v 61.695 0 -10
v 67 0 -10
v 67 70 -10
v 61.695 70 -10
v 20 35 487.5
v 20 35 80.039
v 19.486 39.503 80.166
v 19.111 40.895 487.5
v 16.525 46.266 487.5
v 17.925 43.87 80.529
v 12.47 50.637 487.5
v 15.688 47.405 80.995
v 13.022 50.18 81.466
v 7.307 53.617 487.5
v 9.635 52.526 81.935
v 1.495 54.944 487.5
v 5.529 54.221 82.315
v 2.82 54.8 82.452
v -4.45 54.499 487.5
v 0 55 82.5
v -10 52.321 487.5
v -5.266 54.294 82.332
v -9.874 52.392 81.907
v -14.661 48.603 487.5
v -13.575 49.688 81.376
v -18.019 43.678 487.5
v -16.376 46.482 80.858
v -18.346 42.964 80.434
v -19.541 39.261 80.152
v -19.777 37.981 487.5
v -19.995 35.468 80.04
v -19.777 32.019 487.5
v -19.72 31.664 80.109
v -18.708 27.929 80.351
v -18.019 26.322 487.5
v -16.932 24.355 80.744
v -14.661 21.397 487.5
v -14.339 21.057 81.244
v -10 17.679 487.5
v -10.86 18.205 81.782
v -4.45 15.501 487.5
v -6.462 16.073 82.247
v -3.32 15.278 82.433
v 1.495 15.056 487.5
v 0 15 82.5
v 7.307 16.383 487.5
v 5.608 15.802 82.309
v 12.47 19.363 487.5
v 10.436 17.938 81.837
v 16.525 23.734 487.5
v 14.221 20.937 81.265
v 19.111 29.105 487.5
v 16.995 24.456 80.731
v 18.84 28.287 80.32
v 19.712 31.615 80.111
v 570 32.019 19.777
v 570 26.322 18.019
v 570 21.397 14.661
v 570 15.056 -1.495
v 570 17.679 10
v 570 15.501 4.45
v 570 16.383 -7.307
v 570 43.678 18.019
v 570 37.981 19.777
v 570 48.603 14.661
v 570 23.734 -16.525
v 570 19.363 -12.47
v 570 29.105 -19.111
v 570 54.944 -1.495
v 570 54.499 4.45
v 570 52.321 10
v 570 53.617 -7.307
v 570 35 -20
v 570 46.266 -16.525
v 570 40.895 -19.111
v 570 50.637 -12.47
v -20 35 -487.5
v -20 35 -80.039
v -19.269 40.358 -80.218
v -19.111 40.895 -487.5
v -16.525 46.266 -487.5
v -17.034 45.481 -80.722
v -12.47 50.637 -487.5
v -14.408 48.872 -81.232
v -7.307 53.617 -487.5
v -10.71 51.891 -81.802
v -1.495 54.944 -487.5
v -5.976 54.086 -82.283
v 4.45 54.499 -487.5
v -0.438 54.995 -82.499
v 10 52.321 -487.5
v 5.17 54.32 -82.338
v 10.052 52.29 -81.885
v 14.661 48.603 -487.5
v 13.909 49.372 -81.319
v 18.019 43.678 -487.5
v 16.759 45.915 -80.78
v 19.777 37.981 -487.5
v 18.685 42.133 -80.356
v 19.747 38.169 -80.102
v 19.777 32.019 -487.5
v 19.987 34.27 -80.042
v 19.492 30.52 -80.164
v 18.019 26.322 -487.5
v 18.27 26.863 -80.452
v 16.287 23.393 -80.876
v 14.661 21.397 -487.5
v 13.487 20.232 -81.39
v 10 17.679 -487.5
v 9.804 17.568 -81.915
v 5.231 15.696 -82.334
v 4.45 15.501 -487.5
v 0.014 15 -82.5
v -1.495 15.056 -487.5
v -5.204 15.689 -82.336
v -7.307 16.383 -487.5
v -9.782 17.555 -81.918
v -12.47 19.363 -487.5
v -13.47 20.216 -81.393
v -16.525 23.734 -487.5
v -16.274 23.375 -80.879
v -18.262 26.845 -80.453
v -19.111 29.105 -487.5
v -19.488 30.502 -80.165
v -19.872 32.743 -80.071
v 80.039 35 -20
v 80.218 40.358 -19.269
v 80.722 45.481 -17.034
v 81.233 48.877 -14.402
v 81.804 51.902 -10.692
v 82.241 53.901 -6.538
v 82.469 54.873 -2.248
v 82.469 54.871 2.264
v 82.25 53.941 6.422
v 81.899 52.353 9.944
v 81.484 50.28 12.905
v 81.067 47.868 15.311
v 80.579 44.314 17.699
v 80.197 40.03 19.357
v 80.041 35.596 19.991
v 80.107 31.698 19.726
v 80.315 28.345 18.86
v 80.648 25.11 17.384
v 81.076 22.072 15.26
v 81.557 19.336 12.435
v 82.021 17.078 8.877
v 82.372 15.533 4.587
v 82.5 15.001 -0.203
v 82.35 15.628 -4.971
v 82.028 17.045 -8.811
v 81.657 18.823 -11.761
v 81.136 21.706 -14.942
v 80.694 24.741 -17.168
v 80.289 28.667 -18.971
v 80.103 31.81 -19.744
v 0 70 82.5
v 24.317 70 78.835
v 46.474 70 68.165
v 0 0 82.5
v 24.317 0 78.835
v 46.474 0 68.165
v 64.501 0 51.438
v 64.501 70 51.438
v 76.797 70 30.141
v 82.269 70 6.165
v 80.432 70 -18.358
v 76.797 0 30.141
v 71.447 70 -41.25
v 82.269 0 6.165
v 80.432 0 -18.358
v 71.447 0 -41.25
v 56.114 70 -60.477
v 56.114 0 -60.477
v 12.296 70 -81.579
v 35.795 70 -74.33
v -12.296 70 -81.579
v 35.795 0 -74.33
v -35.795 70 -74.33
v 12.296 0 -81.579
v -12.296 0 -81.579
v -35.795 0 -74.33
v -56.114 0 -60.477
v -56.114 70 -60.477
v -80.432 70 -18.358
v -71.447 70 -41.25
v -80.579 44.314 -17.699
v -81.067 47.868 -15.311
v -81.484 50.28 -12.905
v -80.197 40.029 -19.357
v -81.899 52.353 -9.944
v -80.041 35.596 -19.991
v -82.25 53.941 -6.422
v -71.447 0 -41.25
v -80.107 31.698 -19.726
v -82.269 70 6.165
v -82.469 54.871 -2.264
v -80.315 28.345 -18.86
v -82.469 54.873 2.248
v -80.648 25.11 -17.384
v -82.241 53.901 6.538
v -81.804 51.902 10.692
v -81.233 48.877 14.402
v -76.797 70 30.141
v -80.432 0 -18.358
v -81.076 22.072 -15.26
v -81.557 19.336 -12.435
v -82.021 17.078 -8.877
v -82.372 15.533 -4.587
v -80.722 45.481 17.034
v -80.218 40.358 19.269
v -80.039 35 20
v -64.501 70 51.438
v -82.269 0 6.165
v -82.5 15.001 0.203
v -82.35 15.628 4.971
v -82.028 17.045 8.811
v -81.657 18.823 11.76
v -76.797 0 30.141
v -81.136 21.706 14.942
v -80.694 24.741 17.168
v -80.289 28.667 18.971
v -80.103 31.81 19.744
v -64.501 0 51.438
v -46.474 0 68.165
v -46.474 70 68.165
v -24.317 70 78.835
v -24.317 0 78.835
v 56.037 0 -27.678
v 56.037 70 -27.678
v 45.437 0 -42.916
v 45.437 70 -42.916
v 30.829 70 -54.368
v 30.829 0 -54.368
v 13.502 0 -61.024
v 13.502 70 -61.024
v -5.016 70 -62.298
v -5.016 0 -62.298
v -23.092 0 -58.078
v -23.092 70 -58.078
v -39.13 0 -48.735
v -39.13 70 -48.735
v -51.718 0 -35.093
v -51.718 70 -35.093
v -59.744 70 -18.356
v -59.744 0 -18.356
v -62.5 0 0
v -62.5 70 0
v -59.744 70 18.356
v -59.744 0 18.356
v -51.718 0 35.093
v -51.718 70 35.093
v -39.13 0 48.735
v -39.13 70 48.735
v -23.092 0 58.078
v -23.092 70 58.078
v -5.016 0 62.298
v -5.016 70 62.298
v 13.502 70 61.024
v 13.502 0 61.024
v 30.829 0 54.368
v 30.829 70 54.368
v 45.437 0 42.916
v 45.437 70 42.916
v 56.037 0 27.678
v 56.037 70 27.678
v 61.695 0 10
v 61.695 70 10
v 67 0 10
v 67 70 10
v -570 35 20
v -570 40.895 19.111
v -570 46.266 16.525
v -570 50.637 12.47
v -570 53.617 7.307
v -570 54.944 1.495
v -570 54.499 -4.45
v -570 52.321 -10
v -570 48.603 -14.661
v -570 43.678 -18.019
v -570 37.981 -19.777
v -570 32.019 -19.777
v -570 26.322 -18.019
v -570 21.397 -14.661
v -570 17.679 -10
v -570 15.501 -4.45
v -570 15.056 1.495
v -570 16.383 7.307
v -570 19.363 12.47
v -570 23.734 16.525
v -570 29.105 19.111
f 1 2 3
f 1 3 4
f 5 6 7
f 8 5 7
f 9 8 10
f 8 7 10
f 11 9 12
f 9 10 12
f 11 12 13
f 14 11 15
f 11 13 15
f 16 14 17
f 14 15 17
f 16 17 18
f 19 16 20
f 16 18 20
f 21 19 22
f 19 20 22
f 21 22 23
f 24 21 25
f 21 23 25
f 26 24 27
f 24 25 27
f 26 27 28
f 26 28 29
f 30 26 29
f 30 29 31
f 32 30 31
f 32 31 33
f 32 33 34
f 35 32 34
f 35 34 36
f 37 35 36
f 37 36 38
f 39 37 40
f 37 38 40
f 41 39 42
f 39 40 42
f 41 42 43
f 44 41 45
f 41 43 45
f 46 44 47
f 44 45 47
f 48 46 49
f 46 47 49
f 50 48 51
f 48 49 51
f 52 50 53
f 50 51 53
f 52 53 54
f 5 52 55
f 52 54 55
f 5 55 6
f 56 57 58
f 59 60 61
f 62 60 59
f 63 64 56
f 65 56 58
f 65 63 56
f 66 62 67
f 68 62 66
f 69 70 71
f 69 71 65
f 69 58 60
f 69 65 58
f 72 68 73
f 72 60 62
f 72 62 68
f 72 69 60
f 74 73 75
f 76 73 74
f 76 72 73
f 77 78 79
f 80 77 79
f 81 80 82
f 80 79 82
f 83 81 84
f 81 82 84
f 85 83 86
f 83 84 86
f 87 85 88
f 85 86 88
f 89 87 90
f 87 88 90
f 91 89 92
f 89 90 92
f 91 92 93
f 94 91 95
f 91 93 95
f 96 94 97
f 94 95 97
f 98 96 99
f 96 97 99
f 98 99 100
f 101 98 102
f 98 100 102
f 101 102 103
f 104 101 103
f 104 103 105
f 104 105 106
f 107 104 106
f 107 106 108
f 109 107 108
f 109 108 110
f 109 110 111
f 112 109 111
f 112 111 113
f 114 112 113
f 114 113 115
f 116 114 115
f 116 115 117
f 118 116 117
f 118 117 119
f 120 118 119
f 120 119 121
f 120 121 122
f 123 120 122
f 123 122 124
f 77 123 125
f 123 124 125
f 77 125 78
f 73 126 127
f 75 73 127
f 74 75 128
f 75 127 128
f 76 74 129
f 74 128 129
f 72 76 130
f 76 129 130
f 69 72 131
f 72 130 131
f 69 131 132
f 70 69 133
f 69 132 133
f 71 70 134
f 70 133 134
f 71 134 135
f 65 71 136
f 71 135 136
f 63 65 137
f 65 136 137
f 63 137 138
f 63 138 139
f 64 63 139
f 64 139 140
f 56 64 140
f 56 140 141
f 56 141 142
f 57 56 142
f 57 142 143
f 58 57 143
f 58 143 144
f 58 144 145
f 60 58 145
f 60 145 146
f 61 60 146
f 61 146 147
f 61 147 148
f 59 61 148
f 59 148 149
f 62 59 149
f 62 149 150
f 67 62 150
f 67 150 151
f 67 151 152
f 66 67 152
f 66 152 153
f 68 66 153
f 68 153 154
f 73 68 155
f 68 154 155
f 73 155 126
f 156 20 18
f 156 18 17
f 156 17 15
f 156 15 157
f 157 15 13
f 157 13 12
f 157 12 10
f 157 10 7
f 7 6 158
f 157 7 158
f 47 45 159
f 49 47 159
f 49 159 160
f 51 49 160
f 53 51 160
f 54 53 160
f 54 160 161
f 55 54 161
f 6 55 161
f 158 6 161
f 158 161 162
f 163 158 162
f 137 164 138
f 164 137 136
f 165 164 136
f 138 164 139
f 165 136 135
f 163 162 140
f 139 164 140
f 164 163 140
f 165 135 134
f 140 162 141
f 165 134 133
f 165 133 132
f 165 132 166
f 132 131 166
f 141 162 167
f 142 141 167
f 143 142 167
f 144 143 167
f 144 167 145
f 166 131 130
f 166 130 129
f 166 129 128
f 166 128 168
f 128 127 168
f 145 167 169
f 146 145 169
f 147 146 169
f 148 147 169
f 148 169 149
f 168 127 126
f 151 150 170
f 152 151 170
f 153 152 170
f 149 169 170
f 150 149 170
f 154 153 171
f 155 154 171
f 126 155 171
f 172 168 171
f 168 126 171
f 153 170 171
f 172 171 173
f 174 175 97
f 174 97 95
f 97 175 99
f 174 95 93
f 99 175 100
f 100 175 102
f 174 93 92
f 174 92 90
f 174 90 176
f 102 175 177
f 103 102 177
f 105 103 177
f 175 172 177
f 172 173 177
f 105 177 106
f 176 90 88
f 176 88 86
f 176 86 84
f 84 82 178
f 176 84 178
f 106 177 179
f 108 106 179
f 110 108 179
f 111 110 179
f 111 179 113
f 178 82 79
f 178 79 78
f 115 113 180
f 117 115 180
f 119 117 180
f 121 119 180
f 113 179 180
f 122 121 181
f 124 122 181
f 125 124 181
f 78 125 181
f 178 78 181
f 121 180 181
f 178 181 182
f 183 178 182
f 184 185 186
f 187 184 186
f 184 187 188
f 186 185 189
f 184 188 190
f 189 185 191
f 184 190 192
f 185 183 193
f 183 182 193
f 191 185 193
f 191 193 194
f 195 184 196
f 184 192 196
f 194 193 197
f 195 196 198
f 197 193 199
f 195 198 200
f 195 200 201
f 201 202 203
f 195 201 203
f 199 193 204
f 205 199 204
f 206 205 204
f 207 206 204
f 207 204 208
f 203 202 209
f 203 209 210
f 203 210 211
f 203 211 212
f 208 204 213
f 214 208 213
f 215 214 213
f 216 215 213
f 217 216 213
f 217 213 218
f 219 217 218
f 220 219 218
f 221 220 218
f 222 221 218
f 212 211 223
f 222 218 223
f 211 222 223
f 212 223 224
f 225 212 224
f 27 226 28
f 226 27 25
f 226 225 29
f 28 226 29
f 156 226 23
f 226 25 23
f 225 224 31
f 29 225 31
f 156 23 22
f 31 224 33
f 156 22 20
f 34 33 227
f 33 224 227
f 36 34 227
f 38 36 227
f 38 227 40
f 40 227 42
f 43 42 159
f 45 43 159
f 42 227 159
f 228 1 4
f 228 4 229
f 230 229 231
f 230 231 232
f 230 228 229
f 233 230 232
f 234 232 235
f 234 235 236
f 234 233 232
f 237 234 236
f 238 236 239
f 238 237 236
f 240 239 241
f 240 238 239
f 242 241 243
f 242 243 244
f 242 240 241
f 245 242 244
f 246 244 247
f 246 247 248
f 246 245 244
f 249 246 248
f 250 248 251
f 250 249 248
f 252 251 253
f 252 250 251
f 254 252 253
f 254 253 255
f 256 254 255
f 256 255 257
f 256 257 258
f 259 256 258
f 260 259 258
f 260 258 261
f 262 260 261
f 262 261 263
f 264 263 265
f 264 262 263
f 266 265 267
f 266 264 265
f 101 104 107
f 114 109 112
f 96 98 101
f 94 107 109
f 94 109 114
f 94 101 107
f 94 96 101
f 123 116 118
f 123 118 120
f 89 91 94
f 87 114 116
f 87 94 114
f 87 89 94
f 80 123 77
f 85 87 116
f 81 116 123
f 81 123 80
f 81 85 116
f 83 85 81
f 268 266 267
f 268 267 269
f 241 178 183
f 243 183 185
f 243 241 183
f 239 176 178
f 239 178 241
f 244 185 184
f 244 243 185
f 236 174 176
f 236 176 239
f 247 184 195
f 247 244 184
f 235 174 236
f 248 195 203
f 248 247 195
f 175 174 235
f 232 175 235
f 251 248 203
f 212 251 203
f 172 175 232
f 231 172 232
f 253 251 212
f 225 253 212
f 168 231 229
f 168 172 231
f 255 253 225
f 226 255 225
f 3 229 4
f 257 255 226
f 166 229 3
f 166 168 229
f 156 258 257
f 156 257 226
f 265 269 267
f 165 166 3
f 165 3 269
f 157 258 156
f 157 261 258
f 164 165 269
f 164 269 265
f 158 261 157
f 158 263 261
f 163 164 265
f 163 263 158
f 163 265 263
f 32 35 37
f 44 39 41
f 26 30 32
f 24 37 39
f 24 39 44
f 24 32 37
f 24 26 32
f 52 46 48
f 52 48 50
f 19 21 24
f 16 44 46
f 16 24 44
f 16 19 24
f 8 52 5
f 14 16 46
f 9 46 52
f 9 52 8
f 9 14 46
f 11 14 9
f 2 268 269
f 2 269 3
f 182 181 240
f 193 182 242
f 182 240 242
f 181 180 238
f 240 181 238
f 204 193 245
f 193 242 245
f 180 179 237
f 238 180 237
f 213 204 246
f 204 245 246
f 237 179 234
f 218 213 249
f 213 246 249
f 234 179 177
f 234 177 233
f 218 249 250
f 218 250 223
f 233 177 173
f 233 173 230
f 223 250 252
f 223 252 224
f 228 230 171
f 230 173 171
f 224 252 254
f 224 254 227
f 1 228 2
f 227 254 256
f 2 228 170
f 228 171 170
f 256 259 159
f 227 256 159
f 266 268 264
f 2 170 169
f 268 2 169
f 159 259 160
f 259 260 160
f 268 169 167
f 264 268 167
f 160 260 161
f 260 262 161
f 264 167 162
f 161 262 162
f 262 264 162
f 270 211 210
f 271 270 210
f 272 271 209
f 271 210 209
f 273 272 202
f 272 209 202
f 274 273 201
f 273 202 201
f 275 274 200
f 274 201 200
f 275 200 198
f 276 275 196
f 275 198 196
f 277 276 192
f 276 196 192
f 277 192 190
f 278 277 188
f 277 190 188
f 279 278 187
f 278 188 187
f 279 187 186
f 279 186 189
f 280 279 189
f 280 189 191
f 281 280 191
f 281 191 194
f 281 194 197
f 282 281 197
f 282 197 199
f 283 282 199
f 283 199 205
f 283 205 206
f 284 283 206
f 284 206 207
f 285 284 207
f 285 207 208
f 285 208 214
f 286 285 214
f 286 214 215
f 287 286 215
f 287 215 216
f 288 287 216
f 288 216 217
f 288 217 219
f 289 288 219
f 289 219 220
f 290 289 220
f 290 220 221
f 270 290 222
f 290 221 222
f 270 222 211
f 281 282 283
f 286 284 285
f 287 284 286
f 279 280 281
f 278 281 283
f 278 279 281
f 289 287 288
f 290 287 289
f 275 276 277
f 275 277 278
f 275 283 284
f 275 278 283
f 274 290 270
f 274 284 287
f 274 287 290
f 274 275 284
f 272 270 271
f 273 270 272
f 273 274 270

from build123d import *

# Parameters (mm, degrees)
SKETCH_1_R               = 82.5
EXTRUDE_1_DEPTH          = 70
EXTRUDE_START            = -407.460947
SKETCH_2_R               = 20
EXTRUDE_2_DEPTH          = 407.460947
EXTRUDE_START_2          = -489.960947
SKETCH_4_R               = 20
EXTRUDE_3_DEPTH          = 489.960947
PATTERN_CIRCULAR_2_COUNT = 2


with BuildPart() as part:
    # 스케치1 → 보스-돌출1 (new body)
    with BuildSketch(Plane(origin=(0, 0, 0), x_dir=(1, 0, 0), z_dir=(0, 1, 0))):
        with Locations(Location((0, 0, 0), (0, 0, 270))):  # turned: the seam where the file's is
            Circle(SKETCH_1_R)
        with BuildLine():
            Line((61.694813396, -10), (67, -10))
            Line((67, -10), (67, 10))
            Line((67, 10), (61.694813396, 10))
            ThreePointArc((61.694813396, 10), (-62.5, 0), (61.694813396, -10))
        make_face(mode=Mode.SUBTRACT)
    extrude(amount=EXTRUDE_1_DEPTH)

    # 스케치2 → 보스-돌출2 (add)
    with BuildSketch(Plane.XY.offset(487.5).offset(EXTRUDE_START)):
        with Locations((0, 35)):
            Circle(SKETCH_2_R)
    extrude_2 = extrude(amount=EXTRUDE_2_DEPTH)

    # 스케치4 → 보스-돌출3 (add)
    with BuildSketch(Plane(origin=(570, 0, 0), x_dir=(0, 0, -1), z_dir=(1, 0, 0)).offset(EXTRUDE_START_2)):
        with Locations((0, 35)):
            Circle(SKETCH_4_R)
    extrude_3 = extrude(amount=EXTRUDE_3_DEPTH)

    # 원형 패턴2: 보스-돌출2, 보스-돌출3 ×2 about axis
    pattern_circular_2_axis = Axis((0, 0, 0), (0, 1, 0))
    add([extrude_2.rotate(pattern_circular_2_axis, i * 360 / PATTERN_CIRCULAR_2_COUNT) for i in range(1, PATTERN_CIRCULAR_2_COUNT)])
    add([extrude_3.rotate(pattern_circular_2_axis, i * 360 / PATTERN_CIRCULAR_2_COUNT) for i in range(1, PATTERN_CIRCULAR_2_COUNT)])


solid = part.part
